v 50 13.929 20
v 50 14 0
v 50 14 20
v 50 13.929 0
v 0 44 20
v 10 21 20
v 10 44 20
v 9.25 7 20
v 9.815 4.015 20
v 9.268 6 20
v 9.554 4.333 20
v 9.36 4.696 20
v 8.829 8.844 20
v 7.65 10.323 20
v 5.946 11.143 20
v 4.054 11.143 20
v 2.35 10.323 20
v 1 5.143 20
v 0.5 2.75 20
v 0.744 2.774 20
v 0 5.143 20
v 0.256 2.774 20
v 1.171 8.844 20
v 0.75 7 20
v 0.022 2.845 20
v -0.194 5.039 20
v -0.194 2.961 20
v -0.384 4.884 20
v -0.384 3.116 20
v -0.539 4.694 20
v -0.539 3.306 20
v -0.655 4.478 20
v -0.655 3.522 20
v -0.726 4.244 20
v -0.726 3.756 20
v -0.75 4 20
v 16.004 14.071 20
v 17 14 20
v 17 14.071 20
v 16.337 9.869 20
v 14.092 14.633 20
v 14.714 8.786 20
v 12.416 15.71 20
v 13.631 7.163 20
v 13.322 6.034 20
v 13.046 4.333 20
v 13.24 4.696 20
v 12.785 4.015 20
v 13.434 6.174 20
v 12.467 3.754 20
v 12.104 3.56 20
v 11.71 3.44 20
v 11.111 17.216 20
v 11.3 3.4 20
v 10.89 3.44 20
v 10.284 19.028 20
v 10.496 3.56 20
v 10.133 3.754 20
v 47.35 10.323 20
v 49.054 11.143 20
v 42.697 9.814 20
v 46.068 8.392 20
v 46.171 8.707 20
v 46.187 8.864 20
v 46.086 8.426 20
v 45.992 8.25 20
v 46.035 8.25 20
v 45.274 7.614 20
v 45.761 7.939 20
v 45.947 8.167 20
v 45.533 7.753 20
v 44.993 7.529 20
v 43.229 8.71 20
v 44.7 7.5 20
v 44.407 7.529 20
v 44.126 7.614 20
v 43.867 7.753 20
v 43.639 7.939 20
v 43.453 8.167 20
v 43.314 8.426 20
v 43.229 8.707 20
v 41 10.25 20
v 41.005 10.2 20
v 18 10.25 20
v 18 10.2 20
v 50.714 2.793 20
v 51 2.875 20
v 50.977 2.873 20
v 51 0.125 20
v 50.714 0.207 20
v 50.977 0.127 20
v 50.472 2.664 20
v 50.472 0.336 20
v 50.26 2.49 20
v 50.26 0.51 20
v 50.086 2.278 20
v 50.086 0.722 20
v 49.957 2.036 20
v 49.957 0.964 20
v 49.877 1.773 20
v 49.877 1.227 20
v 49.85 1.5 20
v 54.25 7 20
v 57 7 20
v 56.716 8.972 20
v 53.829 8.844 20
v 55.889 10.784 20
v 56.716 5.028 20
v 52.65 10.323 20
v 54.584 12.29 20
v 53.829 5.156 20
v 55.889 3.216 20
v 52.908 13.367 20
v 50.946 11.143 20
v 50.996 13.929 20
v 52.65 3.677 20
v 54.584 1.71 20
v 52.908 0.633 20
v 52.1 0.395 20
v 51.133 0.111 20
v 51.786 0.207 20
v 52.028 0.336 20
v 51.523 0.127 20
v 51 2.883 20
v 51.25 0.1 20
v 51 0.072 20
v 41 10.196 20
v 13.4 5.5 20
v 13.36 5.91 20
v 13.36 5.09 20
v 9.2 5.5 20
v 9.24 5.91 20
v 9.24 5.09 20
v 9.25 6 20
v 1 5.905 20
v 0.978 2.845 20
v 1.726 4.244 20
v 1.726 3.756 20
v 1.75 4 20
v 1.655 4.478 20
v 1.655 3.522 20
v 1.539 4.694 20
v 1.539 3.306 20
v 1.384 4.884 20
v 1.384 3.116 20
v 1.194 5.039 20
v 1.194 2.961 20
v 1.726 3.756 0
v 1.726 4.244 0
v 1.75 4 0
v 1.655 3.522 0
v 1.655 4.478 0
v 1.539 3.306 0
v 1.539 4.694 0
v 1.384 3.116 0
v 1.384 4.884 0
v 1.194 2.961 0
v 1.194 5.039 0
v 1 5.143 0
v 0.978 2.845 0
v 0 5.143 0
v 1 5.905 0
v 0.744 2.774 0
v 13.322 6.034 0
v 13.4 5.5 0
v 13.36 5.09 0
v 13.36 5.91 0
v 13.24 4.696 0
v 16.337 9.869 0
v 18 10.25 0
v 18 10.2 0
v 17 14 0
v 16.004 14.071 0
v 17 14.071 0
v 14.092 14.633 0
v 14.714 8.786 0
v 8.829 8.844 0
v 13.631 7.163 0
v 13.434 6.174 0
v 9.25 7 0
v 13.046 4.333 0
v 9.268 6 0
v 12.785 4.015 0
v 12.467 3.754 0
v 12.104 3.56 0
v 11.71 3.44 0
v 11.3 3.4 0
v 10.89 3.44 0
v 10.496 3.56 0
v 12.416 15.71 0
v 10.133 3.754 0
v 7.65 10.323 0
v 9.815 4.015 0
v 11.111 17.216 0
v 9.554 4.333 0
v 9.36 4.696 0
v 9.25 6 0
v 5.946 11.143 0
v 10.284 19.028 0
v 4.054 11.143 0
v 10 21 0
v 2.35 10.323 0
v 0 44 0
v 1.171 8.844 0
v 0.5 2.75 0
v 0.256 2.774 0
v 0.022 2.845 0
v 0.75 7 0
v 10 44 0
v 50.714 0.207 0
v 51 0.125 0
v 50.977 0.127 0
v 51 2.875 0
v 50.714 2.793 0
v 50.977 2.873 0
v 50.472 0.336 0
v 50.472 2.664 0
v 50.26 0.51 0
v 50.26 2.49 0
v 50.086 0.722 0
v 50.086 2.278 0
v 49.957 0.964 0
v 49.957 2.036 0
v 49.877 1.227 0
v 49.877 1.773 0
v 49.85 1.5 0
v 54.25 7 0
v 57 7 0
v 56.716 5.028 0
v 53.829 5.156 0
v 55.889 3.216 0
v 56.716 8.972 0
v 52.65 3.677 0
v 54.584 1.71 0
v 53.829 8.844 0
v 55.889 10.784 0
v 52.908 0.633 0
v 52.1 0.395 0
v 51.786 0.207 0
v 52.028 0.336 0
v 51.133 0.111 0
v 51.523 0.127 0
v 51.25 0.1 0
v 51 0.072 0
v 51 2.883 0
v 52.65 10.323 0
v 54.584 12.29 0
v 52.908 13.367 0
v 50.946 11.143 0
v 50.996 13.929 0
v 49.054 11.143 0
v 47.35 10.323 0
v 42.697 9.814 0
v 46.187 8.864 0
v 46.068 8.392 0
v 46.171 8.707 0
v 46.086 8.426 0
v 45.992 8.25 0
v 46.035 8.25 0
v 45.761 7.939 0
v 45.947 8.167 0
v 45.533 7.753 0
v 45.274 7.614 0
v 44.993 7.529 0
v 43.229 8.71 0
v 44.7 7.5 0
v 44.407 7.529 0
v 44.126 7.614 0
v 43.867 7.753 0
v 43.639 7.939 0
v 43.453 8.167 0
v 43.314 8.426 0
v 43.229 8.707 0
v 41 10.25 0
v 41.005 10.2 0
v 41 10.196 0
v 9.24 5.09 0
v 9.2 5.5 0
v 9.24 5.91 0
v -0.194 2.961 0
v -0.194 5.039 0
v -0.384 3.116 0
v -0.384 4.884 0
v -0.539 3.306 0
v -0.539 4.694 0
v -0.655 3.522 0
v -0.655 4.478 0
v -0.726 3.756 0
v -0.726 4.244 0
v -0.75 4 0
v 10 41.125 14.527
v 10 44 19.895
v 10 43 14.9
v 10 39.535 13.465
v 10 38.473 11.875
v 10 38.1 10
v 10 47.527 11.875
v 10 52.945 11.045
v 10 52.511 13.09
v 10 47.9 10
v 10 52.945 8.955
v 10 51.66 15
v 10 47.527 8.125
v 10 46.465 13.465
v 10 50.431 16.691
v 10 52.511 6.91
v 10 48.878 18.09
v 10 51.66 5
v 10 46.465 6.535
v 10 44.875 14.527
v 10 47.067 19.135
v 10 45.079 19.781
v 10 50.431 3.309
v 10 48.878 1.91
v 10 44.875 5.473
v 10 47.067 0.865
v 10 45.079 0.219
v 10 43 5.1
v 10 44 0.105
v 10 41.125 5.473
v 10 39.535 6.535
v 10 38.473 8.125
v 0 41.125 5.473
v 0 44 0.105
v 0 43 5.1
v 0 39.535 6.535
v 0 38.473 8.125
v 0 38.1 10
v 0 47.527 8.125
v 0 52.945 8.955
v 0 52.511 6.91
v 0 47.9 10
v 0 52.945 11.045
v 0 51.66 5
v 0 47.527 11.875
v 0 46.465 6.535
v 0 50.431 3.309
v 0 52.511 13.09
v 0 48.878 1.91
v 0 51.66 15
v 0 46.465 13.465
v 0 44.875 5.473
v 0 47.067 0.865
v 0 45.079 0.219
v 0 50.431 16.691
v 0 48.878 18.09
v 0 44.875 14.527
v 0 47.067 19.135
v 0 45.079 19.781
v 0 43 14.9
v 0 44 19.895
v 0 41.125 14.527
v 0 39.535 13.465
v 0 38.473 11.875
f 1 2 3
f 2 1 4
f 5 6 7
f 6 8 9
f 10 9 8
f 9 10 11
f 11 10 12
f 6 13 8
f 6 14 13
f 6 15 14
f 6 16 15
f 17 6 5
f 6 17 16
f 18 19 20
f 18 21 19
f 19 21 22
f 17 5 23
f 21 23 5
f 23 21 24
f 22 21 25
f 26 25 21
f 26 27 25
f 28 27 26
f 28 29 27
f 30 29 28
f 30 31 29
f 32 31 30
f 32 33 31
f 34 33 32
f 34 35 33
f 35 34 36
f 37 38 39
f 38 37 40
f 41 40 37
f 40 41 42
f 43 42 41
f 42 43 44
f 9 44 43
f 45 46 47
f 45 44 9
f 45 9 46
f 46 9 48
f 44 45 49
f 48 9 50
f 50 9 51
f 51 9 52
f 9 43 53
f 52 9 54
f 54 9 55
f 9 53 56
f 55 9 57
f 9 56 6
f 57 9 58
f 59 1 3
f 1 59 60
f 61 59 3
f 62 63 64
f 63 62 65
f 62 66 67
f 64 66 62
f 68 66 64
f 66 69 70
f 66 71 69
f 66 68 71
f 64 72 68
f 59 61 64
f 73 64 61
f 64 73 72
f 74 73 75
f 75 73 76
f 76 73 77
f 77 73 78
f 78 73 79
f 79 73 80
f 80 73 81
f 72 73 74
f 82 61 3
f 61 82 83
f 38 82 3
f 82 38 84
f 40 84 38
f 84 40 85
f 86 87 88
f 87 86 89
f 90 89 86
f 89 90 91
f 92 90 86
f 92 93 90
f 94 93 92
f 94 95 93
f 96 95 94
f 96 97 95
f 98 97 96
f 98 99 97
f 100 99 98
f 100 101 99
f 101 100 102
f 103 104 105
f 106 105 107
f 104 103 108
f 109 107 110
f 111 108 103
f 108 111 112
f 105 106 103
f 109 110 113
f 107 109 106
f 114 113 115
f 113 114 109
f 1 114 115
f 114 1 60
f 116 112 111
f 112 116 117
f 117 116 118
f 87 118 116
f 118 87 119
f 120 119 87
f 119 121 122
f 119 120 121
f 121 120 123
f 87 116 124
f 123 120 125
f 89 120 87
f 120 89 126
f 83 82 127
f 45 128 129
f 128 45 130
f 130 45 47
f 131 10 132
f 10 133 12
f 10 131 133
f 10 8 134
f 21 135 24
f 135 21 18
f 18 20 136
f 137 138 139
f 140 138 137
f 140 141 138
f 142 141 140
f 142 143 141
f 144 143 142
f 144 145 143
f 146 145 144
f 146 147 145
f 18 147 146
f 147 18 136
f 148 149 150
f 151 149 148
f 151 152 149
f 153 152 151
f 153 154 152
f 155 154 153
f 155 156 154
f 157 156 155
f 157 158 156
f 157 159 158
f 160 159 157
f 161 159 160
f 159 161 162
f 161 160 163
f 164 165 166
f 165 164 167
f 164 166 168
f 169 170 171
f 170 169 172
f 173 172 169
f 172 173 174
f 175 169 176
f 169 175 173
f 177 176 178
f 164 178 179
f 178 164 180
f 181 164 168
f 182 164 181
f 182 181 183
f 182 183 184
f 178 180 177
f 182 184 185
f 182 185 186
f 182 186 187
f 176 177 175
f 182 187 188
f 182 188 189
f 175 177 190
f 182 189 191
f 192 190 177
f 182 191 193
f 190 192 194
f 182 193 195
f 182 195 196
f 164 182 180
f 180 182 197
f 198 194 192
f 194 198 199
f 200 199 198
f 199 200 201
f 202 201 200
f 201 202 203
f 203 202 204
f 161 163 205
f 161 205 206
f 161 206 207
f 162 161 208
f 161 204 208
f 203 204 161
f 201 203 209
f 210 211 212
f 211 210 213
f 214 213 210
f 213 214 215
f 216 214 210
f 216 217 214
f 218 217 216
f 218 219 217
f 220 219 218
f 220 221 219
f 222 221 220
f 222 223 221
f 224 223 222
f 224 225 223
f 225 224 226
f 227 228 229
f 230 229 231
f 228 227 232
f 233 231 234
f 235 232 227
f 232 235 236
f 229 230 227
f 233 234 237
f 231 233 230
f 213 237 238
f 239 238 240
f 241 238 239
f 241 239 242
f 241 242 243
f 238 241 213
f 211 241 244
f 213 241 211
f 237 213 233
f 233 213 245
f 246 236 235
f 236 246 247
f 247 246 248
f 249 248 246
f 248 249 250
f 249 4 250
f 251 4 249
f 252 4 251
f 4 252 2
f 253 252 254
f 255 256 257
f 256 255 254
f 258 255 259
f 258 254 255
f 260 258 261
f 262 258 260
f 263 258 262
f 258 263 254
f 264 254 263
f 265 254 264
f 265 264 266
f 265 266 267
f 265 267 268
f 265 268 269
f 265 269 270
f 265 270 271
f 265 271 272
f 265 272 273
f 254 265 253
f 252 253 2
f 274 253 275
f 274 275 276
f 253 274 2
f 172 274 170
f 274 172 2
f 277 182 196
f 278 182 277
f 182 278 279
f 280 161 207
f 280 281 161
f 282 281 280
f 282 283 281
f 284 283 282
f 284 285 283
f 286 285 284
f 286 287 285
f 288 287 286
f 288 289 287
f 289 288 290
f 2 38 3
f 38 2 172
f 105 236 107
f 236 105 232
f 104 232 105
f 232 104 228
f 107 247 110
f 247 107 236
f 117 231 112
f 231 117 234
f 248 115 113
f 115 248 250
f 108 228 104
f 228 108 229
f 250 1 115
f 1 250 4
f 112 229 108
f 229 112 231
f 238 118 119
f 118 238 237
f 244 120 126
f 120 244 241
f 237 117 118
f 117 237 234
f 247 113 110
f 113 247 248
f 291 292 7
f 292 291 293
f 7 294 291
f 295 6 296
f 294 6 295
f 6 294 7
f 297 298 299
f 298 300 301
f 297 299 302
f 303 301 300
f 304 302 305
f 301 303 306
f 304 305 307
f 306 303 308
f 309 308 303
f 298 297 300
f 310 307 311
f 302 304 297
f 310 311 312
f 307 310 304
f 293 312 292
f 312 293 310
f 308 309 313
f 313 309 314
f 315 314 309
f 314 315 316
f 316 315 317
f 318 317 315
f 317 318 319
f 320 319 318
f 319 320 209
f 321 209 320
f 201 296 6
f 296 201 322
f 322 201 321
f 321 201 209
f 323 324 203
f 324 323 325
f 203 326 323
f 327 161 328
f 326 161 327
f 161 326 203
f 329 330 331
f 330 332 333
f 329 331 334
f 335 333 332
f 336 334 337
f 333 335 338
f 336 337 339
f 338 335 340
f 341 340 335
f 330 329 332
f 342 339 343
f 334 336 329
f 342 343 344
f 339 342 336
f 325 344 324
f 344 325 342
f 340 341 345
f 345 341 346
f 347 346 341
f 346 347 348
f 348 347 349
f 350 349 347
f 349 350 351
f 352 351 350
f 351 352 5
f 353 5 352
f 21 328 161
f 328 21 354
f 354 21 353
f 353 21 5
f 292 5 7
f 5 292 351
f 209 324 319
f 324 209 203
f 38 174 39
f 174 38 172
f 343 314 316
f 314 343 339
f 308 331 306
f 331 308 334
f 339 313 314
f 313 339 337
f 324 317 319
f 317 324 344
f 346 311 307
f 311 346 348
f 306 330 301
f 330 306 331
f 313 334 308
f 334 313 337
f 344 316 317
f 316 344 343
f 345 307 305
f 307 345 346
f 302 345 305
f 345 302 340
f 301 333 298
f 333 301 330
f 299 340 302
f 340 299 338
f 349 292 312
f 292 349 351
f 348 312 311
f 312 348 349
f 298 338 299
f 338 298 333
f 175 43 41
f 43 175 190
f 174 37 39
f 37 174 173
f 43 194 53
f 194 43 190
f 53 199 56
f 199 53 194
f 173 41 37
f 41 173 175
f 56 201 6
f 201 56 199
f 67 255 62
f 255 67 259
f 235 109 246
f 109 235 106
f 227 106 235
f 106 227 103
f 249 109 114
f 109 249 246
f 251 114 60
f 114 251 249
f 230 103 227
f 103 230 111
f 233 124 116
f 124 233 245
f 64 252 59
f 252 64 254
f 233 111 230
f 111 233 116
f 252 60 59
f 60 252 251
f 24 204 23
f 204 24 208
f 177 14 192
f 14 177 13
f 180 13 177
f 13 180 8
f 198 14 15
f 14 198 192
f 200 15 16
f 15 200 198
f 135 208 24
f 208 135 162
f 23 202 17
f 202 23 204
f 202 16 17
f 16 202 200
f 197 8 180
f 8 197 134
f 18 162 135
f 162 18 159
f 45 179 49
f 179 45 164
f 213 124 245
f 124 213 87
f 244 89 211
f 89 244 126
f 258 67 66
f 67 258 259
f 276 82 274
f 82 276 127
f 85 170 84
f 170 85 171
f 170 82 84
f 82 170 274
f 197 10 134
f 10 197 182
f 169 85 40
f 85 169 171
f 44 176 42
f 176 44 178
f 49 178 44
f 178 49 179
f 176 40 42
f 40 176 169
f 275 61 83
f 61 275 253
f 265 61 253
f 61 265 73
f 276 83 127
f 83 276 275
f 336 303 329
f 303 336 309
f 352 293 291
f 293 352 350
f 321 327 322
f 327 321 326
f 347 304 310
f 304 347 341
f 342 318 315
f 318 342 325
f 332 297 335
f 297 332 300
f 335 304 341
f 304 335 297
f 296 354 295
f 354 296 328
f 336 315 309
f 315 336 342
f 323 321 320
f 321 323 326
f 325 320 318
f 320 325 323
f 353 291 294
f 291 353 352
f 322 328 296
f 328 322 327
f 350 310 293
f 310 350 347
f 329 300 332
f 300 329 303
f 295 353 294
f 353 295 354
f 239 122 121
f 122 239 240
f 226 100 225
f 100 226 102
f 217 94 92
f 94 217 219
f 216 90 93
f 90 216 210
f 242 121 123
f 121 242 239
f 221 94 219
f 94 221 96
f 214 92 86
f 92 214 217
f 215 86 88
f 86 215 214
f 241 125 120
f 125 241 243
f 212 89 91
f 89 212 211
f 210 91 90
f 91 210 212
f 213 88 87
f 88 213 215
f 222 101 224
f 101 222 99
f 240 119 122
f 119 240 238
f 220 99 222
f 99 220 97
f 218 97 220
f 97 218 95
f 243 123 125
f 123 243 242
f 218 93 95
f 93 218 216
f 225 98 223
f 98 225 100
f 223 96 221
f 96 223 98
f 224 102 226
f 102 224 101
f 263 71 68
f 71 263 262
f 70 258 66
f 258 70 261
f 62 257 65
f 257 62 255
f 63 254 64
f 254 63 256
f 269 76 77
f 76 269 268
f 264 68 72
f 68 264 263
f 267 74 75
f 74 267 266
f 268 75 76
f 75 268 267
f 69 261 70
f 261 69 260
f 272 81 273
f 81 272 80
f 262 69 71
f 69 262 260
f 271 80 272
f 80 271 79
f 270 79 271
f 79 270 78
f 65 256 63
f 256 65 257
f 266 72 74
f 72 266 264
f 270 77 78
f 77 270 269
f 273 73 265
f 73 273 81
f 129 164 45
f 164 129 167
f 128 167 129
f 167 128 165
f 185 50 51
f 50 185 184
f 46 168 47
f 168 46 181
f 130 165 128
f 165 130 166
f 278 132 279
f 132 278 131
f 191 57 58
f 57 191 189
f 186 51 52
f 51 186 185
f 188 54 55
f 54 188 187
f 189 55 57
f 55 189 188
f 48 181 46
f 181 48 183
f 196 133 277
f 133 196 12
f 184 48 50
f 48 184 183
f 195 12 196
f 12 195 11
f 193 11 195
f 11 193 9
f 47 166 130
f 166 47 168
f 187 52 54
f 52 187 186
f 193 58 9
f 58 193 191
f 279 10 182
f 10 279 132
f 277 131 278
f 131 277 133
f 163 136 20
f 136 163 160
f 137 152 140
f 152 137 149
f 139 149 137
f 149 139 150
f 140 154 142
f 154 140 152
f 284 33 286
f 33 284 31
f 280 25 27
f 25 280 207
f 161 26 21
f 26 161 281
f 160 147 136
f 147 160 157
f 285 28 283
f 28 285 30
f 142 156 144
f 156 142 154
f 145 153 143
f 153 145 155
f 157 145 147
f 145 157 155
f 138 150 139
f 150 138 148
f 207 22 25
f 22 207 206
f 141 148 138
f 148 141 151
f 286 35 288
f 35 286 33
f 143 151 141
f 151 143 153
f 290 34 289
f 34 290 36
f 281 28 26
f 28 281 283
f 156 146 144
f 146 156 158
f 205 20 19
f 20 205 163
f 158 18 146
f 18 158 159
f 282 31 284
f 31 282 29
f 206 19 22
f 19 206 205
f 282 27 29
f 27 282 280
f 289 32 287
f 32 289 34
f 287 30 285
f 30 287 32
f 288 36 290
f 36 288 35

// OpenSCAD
// Dial Gauge Mount for Prusa i3
//
// This thing is designed to allow you to use a typical dial guage
// for tramming (leveling) the print bed.
//
// Notes
//
// The only parameter you should have to change is the diameter of
// the tool itself. The hole for the tool should be snug so that 
// the tool does not get dislodged when raising or lowering the
// Z-axis. If it is too snug, you can use a rolled up piece of
// sand paper to make the hole a bit larger. You can also change
// the parameter to the method and recompile the object if the 
// tolerance is too large.
//
// Instructions for Use
//
// To use the thing, move the extruder to the center of the X-axis
// (not by hand!), insert your gauge into the mount, and clip the 
// mount onto the X-axis to the left of your extruder. Press the 
// top on first then swing the bottom until it lightly clicks onto 
// the lower bar.
//
// Move the Z-axis (not by hand!) so that the dial tip makes contact
// with the print bed. Move it closer a few millemeters to ensure
// the dial gauge will have a good range of motion.
//
// To tram your print bed, move the gauge to the left-most edge of
// the print bed and move your Y-axis to the home position (not by 
// hand!). This should be the [0,0,0] corner (home) of your print 
// bed. Note the value (I like to turn the dial so the gauge reads
// 0. Make sure your bed adjuster is not too far out of the middle 
// range.
//
// Next, move the Y-axis (not by hand!) to the MAX point and adjust 
// the bed until the dial reads '0' or as close to it as your 
// patience will permit. ;) Now you see why I move the dial to '0'!
//
// Next, move the gauge to the other side of the X-axis carefully
// so as to not change the position of the tool in the mount or the
// position of the dial. Measure and adjust the MAX/MAX point for X/Y. 
//
// Finally, move the Y-axis to 0 (not by hand!) and measure and 
// adjust the last corner. 
//
// Epilogue
//
// Even if you opt to upgrade to an auto bed leveling feature,
// you should periodically tram your print bed to ensure long,
// happy printing experiences.
//
// You may be wondering why I say not to move the axes by hand.
// This is simply because moving an axis by hand will cause the
// stepper motors to act like a generator and generate a small
// amount of current which is fed back to your electronics.
// Moving the axis slowly may not generate enough current to 
// damage the electronics, but why take the chance? Use your
// printer's LCD panel to move (jog) the axes or use a good
// printer controller application to do the same (e.g. 
// Printrun or Repetier-Host).
//
// Created by: drcharlesbell@gmail.com
// 
// Enjoy!

module dial_gauge_clamp_i3(tool_diameter=9.80) {
  // build the body
  difference() {
    union() {
      translate([5,0,0]) cube([45,14,20]);
      translate([50,7,0]) cylinder(20,7,7);
      translate([7,7,0]) cylinder(20,7,7);
      translate([0,7,0]) cube([10,37,20]);
      translate([10,14,0]) cube([7,7,20]);
      translate([0,43,10]) rotate([0,90,0]) cylinder(10,10,10);
    }

    // remove material to allow clamp to be small and not
    // interfere with X axis belt
    translate([17,21,0]) cylinder(20,7,7);
    translate([50,7,0]) cylinder(20,4.25,4.25);
    translate([5,7,0]) cylinder(20,4.25,4.25);
    translate([1,0,0]) cube([8.25,7,20]);
    translate([17,4,0]) cylinder(20,4.25,4.25);
    translate([40,4,0]) cylinder(20,4.25,4.25);
    translate([40,-11.75,0]) cube([11,20,20]);
    translate([18,0,0]) cube([23,10.25,20]);
    translate([8,0,0]) cube([10,6,20]);
    translate([18.25,5.25,0]) cylinder(20,5,5);
    translate([41.45,8.25,0]) cylinder(20,2,2);

    // diameter of tool
    translate([-1,43,10]) rotate([0,90,0]) 
      cylinder(12,tool_diameter/2,tool_diameter/2);
  }

  // add bumps for rail catches
  union(){
    translate([51.25,1.5,0]) cylinder(20,1.4,1.4,$fn=32);
    translate([44.7,9,0]) cylinder(20,1.5,1.5,$fn=32);
    translate([11.3,5.5,0]) cylinder(20,2.1,2.1,$fn=32);
    translate([0.5,4,0]) cylinder(20,1.25,1.25,$fn=32);
    translate([0,5,0]) cube([.75,3,20]); 
  }
}

dial_gauge_clamp_i3();
